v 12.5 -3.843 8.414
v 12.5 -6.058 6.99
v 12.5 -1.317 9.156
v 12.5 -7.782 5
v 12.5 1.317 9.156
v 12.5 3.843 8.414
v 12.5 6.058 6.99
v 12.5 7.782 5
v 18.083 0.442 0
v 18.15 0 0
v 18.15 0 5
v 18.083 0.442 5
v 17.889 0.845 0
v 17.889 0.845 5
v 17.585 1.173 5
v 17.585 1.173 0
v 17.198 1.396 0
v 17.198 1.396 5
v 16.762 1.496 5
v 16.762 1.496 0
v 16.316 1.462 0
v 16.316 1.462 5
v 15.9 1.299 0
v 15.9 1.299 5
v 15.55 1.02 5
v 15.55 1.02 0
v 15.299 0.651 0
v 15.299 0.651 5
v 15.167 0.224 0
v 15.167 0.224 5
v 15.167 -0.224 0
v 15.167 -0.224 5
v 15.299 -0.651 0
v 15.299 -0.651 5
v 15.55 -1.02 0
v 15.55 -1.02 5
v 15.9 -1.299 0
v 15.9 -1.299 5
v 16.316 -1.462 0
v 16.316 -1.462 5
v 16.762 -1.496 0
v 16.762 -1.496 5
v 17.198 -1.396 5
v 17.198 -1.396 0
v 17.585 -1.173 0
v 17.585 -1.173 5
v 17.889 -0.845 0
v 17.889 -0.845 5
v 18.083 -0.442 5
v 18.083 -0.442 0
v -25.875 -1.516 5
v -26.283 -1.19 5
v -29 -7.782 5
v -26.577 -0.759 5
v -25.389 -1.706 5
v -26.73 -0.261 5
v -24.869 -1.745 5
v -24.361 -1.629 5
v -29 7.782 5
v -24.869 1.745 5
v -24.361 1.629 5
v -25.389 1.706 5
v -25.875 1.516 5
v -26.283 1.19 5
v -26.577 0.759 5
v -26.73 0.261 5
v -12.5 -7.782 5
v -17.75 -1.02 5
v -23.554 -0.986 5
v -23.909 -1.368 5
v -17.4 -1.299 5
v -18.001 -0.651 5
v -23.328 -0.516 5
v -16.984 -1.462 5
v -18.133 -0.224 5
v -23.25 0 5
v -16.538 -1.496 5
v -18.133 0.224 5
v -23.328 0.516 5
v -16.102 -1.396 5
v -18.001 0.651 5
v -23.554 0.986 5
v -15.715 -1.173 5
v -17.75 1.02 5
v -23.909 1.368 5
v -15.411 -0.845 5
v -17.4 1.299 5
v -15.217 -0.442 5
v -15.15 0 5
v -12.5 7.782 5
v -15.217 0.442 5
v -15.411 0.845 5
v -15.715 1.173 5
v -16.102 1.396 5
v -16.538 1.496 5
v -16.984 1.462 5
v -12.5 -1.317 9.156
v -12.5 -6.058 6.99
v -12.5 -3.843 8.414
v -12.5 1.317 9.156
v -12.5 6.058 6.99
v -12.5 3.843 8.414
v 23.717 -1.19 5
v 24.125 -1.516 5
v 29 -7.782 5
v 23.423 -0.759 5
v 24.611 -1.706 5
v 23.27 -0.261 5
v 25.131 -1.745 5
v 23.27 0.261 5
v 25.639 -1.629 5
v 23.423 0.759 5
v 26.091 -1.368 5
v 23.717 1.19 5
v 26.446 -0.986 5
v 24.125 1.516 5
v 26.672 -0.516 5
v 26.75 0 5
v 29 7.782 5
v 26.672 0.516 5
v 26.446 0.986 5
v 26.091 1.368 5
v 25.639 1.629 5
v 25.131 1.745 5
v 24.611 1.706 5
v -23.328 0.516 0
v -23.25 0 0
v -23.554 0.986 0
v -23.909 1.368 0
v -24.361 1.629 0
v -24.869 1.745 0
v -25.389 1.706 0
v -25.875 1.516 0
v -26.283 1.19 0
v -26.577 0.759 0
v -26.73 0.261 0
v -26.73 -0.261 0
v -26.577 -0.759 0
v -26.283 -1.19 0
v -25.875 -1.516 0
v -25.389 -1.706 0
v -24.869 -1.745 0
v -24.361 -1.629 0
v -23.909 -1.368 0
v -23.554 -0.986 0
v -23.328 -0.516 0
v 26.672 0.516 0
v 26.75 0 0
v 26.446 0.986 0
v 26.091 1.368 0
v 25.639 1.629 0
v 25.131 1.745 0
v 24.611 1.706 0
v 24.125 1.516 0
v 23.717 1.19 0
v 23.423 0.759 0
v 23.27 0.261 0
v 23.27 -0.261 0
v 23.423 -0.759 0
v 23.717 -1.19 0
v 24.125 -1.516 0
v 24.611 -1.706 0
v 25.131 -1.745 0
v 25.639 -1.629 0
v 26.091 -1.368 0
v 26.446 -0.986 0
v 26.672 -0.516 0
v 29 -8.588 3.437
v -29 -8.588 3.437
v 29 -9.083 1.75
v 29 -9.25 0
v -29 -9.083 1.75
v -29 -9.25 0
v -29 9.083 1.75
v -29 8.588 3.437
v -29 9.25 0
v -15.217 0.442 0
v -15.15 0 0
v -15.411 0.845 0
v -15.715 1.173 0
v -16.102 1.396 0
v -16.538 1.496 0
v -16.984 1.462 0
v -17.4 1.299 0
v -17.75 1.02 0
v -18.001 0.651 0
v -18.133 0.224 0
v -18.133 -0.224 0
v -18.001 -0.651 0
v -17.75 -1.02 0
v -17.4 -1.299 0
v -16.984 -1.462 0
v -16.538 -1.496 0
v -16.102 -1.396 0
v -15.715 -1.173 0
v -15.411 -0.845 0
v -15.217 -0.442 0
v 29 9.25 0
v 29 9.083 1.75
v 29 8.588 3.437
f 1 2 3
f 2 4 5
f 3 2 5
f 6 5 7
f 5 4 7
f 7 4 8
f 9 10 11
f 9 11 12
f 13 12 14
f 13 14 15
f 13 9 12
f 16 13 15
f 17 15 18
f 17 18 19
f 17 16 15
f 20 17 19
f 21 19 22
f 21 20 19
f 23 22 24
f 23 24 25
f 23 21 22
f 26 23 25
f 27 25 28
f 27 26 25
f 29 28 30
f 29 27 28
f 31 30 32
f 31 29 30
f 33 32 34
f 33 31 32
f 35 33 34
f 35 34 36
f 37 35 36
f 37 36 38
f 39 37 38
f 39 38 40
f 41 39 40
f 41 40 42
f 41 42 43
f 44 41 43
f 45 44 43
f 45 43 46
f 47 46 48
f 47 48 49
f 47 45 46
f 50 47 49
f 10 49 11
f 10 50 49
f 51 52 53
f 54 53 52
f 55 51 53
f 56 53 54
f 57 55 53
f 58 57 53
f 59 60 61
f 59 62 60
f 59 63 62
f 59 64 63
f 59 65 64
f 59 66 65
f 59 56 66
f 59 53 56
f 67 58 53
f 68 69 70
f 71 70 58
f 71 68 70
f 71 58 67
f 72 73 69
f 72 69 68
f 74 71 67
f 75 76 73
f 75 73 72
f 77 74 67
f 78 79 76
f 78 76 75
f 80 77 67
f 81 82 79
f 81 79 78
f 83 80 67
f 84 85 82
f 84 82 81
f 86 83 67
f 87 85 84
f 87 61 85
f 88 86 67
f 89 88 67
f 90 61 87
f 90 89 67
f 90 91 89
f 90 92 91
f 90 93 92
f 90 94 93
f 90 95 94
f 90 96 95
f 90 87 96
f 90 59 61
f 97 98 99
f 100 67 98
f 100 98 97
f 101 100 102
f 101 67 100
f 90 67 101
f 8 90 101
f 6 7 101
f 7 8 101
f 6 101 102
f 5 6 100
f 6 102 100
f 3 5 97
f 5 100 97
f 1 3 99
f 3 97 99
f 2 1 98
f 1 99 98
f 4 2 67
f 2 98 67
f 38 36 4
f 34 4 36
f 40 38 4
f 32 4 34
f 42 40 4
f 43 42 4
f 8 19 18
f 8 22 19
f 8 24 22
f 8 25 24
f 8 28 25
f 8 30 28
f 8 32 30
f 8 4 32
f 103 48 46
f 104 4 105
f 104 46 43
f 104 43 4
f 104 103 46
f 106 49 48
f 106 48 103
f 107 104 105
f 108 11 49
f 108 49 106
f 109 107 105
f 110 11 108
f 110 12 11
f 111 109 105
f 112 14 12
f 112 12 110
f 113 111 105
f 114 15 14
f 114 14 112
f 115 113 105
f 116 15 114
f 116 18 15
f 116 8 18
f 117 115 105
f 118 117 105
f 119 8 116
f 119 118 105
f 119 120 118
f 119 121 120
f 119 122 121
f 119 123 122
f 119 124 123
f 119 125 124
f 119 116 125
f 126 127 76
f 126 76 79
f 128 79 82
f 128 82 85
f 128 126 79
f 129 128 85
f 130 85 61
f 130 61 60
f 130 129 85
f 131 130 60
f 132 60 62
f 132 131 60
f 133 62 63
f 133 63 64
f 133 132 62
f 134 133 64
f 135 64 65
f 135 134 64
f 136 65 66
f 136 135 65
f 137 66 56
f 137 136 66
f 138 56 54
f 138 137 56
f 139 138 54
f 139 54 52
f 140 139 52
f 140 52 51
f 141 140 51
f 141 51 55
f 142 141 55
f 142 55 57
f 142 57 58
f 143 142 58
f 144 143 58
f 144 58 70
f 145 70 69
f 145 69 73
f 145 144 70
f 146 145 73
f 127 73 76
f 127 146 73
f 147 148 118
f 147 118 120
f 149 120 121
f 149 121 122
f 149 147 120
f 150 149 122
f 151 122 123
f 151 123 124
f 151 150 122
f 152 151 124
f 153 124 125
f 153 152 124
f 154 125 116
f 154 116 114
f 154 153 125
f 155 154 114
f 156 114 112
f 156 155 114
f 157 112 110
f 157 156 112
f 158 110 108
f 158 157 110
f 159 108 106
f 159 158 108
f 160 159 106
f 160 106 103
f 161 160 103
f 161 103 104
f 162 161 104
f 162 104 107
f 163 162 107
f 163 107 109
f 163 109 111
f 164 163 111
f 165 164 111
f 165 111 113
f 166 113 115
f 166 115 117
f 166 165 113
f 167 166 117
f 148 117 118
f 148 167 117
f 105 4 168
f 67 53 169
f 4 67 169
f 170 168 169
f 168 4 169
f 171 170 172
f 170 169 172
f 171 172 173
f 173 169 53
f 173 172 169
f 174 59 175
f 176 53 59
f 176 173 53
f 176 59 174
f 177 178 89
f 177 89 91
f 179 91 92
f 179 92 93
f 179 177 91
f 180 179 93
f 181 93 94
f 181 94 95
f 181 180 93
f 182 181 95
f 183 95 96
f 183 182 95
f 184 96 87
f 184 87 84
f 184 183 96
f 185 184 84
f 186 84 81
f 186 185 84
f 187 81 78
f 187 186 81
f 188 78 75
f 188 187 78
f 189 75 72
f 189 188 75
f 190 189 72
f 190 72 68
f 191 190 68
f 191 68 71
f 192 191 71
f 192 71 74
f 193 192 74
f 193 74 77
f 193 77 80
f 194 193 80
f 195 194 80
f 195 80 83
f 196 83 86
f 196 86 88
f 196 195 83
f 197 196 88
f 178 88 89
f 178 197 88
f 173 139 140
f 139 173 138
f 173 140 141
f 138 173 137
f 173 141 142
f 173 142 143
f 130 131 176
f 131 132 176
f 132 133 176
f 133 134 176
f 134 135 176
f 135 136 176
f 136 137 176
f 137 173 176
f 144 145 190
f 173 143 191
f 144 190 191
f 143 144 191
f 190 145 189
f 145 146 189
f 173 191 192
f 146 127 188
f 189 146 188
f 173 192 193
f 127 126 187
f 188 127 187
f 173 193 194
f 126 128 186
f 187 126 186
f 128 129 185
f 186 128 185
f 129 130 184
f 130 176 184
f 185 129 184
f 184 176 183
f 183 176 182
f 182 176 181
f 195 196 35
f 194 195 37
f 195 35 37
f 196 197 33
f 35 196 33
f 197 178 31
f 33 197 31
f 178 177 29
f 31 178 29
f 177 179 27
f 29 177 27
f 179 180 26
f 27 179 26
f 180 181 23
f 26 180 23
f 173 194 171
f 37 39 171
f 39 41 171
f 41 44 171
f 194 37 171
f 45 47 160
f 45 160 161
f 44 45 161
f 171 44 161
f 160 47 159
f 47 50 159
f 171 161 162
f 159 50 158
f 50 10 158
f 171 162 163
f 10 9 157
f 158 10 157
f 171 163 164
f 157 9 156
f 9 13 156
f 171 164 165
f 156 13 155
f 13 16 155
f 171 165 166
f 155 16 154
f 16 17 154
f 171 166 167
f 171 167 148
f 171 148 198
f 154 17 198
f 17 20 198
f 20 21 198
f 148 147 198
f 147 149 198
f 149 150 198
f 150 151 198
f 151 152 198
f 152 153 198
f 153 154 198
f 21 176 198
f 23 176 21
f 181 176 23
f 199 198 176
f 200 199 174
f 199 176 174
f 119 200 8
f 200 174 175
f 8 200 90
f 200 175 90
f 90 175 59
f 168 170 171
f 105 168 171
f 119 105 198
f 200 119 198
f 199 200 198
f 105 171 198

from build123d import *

# Parameters (mm, degrees)
F0_W     = 38
F0_H     = 18.5
F0_R     = 1.5
F0_W_2   = 10
F0_R_2   = 1.75
F1_DEPTH = 5
F2_W     = 25
F2_H     = 18.5
F3_DEPTH = 9.25
F5_DEPTH = 58.001


with BuildPart() as f1:
    # F0 (on Top) → F1 (new body)
    with BuildSketch(Plane.XY):
        Rectangle(F0_W, F0_H)
        with Locations((-16.65, 0)):
            Circle(F0_R, mode=Mode.SUBTRACT)
        with Locations((16.65, 0)):
            Circle(F0_R, mode=Mode.SUBTRACT)
        with Locations((24, 0)):
            Rectangle(F0_W_2, F0_H)
        with Locations((25, 0)):
            Circle(F0_R_2, mode=Mode.SUBTRACT)
        with Locations((-24, 0)):
            Rectangle(F0_W_2, F0_H)
        with Locations((-25, 0)):
            Circle(F0_R_2, mode=Mode.SUBTRACT)
    extrude(amount=F1_DEPTH)

    # F2 (on face) → F3 (join)
    with BuildSketch(Plane.XY.offset(5)):
        Rectangle(F2_W, F2_H)
    extrude(amount=F3_DEPTH)

    # F4 (on face) → F5 (cut, through all)
    with BuildSketch(Plane(origin=(-29, 0, 0), x_dir=(0, -1, 0), z_dir=(-1, 0, 0))):
        with BuildLine():
            Line((9.25, 5), (9.25, 0))
            Line((9.25, 0), (9.75, 0))
            Line((9.75, 0), (9.75, 19))
            Line((9.75, 19), (-9.25, 19))
            Line((-9.25, 19), (-9.25, 5))
            Line((-9.25, 5), (-7.7821912081, 5))
            ThreePointArc((-7.7821912081, 5), (0, 9.25), (7.7821912081, 5))
            Line((7.7821912081, 5), (9.25, 5))
        make_face()
        with BuildLine():
            ThreePointArc((7.7821912081, 5), (8.8754653026, 2.6054972006), (9.25, 0))
            Line((9.25, 0), (9.25, 5))
            Line((9.25, 5), (7.7821912081, 5))
        make_face()
        with BuildLine():
            Line((-9.25, 5), (-9.25, 0))
            ThreePointArc((-9.25, 0), (-8.8754653026, 2.6054972006), (-7.7821912081, 5))
            Line((-7.7821912081, 5), (-9.25, 5))
        make_face()
    extrude(amount=-F5_DEPTH, mode=Mode.SUBTRACT)


solid = f1.part
